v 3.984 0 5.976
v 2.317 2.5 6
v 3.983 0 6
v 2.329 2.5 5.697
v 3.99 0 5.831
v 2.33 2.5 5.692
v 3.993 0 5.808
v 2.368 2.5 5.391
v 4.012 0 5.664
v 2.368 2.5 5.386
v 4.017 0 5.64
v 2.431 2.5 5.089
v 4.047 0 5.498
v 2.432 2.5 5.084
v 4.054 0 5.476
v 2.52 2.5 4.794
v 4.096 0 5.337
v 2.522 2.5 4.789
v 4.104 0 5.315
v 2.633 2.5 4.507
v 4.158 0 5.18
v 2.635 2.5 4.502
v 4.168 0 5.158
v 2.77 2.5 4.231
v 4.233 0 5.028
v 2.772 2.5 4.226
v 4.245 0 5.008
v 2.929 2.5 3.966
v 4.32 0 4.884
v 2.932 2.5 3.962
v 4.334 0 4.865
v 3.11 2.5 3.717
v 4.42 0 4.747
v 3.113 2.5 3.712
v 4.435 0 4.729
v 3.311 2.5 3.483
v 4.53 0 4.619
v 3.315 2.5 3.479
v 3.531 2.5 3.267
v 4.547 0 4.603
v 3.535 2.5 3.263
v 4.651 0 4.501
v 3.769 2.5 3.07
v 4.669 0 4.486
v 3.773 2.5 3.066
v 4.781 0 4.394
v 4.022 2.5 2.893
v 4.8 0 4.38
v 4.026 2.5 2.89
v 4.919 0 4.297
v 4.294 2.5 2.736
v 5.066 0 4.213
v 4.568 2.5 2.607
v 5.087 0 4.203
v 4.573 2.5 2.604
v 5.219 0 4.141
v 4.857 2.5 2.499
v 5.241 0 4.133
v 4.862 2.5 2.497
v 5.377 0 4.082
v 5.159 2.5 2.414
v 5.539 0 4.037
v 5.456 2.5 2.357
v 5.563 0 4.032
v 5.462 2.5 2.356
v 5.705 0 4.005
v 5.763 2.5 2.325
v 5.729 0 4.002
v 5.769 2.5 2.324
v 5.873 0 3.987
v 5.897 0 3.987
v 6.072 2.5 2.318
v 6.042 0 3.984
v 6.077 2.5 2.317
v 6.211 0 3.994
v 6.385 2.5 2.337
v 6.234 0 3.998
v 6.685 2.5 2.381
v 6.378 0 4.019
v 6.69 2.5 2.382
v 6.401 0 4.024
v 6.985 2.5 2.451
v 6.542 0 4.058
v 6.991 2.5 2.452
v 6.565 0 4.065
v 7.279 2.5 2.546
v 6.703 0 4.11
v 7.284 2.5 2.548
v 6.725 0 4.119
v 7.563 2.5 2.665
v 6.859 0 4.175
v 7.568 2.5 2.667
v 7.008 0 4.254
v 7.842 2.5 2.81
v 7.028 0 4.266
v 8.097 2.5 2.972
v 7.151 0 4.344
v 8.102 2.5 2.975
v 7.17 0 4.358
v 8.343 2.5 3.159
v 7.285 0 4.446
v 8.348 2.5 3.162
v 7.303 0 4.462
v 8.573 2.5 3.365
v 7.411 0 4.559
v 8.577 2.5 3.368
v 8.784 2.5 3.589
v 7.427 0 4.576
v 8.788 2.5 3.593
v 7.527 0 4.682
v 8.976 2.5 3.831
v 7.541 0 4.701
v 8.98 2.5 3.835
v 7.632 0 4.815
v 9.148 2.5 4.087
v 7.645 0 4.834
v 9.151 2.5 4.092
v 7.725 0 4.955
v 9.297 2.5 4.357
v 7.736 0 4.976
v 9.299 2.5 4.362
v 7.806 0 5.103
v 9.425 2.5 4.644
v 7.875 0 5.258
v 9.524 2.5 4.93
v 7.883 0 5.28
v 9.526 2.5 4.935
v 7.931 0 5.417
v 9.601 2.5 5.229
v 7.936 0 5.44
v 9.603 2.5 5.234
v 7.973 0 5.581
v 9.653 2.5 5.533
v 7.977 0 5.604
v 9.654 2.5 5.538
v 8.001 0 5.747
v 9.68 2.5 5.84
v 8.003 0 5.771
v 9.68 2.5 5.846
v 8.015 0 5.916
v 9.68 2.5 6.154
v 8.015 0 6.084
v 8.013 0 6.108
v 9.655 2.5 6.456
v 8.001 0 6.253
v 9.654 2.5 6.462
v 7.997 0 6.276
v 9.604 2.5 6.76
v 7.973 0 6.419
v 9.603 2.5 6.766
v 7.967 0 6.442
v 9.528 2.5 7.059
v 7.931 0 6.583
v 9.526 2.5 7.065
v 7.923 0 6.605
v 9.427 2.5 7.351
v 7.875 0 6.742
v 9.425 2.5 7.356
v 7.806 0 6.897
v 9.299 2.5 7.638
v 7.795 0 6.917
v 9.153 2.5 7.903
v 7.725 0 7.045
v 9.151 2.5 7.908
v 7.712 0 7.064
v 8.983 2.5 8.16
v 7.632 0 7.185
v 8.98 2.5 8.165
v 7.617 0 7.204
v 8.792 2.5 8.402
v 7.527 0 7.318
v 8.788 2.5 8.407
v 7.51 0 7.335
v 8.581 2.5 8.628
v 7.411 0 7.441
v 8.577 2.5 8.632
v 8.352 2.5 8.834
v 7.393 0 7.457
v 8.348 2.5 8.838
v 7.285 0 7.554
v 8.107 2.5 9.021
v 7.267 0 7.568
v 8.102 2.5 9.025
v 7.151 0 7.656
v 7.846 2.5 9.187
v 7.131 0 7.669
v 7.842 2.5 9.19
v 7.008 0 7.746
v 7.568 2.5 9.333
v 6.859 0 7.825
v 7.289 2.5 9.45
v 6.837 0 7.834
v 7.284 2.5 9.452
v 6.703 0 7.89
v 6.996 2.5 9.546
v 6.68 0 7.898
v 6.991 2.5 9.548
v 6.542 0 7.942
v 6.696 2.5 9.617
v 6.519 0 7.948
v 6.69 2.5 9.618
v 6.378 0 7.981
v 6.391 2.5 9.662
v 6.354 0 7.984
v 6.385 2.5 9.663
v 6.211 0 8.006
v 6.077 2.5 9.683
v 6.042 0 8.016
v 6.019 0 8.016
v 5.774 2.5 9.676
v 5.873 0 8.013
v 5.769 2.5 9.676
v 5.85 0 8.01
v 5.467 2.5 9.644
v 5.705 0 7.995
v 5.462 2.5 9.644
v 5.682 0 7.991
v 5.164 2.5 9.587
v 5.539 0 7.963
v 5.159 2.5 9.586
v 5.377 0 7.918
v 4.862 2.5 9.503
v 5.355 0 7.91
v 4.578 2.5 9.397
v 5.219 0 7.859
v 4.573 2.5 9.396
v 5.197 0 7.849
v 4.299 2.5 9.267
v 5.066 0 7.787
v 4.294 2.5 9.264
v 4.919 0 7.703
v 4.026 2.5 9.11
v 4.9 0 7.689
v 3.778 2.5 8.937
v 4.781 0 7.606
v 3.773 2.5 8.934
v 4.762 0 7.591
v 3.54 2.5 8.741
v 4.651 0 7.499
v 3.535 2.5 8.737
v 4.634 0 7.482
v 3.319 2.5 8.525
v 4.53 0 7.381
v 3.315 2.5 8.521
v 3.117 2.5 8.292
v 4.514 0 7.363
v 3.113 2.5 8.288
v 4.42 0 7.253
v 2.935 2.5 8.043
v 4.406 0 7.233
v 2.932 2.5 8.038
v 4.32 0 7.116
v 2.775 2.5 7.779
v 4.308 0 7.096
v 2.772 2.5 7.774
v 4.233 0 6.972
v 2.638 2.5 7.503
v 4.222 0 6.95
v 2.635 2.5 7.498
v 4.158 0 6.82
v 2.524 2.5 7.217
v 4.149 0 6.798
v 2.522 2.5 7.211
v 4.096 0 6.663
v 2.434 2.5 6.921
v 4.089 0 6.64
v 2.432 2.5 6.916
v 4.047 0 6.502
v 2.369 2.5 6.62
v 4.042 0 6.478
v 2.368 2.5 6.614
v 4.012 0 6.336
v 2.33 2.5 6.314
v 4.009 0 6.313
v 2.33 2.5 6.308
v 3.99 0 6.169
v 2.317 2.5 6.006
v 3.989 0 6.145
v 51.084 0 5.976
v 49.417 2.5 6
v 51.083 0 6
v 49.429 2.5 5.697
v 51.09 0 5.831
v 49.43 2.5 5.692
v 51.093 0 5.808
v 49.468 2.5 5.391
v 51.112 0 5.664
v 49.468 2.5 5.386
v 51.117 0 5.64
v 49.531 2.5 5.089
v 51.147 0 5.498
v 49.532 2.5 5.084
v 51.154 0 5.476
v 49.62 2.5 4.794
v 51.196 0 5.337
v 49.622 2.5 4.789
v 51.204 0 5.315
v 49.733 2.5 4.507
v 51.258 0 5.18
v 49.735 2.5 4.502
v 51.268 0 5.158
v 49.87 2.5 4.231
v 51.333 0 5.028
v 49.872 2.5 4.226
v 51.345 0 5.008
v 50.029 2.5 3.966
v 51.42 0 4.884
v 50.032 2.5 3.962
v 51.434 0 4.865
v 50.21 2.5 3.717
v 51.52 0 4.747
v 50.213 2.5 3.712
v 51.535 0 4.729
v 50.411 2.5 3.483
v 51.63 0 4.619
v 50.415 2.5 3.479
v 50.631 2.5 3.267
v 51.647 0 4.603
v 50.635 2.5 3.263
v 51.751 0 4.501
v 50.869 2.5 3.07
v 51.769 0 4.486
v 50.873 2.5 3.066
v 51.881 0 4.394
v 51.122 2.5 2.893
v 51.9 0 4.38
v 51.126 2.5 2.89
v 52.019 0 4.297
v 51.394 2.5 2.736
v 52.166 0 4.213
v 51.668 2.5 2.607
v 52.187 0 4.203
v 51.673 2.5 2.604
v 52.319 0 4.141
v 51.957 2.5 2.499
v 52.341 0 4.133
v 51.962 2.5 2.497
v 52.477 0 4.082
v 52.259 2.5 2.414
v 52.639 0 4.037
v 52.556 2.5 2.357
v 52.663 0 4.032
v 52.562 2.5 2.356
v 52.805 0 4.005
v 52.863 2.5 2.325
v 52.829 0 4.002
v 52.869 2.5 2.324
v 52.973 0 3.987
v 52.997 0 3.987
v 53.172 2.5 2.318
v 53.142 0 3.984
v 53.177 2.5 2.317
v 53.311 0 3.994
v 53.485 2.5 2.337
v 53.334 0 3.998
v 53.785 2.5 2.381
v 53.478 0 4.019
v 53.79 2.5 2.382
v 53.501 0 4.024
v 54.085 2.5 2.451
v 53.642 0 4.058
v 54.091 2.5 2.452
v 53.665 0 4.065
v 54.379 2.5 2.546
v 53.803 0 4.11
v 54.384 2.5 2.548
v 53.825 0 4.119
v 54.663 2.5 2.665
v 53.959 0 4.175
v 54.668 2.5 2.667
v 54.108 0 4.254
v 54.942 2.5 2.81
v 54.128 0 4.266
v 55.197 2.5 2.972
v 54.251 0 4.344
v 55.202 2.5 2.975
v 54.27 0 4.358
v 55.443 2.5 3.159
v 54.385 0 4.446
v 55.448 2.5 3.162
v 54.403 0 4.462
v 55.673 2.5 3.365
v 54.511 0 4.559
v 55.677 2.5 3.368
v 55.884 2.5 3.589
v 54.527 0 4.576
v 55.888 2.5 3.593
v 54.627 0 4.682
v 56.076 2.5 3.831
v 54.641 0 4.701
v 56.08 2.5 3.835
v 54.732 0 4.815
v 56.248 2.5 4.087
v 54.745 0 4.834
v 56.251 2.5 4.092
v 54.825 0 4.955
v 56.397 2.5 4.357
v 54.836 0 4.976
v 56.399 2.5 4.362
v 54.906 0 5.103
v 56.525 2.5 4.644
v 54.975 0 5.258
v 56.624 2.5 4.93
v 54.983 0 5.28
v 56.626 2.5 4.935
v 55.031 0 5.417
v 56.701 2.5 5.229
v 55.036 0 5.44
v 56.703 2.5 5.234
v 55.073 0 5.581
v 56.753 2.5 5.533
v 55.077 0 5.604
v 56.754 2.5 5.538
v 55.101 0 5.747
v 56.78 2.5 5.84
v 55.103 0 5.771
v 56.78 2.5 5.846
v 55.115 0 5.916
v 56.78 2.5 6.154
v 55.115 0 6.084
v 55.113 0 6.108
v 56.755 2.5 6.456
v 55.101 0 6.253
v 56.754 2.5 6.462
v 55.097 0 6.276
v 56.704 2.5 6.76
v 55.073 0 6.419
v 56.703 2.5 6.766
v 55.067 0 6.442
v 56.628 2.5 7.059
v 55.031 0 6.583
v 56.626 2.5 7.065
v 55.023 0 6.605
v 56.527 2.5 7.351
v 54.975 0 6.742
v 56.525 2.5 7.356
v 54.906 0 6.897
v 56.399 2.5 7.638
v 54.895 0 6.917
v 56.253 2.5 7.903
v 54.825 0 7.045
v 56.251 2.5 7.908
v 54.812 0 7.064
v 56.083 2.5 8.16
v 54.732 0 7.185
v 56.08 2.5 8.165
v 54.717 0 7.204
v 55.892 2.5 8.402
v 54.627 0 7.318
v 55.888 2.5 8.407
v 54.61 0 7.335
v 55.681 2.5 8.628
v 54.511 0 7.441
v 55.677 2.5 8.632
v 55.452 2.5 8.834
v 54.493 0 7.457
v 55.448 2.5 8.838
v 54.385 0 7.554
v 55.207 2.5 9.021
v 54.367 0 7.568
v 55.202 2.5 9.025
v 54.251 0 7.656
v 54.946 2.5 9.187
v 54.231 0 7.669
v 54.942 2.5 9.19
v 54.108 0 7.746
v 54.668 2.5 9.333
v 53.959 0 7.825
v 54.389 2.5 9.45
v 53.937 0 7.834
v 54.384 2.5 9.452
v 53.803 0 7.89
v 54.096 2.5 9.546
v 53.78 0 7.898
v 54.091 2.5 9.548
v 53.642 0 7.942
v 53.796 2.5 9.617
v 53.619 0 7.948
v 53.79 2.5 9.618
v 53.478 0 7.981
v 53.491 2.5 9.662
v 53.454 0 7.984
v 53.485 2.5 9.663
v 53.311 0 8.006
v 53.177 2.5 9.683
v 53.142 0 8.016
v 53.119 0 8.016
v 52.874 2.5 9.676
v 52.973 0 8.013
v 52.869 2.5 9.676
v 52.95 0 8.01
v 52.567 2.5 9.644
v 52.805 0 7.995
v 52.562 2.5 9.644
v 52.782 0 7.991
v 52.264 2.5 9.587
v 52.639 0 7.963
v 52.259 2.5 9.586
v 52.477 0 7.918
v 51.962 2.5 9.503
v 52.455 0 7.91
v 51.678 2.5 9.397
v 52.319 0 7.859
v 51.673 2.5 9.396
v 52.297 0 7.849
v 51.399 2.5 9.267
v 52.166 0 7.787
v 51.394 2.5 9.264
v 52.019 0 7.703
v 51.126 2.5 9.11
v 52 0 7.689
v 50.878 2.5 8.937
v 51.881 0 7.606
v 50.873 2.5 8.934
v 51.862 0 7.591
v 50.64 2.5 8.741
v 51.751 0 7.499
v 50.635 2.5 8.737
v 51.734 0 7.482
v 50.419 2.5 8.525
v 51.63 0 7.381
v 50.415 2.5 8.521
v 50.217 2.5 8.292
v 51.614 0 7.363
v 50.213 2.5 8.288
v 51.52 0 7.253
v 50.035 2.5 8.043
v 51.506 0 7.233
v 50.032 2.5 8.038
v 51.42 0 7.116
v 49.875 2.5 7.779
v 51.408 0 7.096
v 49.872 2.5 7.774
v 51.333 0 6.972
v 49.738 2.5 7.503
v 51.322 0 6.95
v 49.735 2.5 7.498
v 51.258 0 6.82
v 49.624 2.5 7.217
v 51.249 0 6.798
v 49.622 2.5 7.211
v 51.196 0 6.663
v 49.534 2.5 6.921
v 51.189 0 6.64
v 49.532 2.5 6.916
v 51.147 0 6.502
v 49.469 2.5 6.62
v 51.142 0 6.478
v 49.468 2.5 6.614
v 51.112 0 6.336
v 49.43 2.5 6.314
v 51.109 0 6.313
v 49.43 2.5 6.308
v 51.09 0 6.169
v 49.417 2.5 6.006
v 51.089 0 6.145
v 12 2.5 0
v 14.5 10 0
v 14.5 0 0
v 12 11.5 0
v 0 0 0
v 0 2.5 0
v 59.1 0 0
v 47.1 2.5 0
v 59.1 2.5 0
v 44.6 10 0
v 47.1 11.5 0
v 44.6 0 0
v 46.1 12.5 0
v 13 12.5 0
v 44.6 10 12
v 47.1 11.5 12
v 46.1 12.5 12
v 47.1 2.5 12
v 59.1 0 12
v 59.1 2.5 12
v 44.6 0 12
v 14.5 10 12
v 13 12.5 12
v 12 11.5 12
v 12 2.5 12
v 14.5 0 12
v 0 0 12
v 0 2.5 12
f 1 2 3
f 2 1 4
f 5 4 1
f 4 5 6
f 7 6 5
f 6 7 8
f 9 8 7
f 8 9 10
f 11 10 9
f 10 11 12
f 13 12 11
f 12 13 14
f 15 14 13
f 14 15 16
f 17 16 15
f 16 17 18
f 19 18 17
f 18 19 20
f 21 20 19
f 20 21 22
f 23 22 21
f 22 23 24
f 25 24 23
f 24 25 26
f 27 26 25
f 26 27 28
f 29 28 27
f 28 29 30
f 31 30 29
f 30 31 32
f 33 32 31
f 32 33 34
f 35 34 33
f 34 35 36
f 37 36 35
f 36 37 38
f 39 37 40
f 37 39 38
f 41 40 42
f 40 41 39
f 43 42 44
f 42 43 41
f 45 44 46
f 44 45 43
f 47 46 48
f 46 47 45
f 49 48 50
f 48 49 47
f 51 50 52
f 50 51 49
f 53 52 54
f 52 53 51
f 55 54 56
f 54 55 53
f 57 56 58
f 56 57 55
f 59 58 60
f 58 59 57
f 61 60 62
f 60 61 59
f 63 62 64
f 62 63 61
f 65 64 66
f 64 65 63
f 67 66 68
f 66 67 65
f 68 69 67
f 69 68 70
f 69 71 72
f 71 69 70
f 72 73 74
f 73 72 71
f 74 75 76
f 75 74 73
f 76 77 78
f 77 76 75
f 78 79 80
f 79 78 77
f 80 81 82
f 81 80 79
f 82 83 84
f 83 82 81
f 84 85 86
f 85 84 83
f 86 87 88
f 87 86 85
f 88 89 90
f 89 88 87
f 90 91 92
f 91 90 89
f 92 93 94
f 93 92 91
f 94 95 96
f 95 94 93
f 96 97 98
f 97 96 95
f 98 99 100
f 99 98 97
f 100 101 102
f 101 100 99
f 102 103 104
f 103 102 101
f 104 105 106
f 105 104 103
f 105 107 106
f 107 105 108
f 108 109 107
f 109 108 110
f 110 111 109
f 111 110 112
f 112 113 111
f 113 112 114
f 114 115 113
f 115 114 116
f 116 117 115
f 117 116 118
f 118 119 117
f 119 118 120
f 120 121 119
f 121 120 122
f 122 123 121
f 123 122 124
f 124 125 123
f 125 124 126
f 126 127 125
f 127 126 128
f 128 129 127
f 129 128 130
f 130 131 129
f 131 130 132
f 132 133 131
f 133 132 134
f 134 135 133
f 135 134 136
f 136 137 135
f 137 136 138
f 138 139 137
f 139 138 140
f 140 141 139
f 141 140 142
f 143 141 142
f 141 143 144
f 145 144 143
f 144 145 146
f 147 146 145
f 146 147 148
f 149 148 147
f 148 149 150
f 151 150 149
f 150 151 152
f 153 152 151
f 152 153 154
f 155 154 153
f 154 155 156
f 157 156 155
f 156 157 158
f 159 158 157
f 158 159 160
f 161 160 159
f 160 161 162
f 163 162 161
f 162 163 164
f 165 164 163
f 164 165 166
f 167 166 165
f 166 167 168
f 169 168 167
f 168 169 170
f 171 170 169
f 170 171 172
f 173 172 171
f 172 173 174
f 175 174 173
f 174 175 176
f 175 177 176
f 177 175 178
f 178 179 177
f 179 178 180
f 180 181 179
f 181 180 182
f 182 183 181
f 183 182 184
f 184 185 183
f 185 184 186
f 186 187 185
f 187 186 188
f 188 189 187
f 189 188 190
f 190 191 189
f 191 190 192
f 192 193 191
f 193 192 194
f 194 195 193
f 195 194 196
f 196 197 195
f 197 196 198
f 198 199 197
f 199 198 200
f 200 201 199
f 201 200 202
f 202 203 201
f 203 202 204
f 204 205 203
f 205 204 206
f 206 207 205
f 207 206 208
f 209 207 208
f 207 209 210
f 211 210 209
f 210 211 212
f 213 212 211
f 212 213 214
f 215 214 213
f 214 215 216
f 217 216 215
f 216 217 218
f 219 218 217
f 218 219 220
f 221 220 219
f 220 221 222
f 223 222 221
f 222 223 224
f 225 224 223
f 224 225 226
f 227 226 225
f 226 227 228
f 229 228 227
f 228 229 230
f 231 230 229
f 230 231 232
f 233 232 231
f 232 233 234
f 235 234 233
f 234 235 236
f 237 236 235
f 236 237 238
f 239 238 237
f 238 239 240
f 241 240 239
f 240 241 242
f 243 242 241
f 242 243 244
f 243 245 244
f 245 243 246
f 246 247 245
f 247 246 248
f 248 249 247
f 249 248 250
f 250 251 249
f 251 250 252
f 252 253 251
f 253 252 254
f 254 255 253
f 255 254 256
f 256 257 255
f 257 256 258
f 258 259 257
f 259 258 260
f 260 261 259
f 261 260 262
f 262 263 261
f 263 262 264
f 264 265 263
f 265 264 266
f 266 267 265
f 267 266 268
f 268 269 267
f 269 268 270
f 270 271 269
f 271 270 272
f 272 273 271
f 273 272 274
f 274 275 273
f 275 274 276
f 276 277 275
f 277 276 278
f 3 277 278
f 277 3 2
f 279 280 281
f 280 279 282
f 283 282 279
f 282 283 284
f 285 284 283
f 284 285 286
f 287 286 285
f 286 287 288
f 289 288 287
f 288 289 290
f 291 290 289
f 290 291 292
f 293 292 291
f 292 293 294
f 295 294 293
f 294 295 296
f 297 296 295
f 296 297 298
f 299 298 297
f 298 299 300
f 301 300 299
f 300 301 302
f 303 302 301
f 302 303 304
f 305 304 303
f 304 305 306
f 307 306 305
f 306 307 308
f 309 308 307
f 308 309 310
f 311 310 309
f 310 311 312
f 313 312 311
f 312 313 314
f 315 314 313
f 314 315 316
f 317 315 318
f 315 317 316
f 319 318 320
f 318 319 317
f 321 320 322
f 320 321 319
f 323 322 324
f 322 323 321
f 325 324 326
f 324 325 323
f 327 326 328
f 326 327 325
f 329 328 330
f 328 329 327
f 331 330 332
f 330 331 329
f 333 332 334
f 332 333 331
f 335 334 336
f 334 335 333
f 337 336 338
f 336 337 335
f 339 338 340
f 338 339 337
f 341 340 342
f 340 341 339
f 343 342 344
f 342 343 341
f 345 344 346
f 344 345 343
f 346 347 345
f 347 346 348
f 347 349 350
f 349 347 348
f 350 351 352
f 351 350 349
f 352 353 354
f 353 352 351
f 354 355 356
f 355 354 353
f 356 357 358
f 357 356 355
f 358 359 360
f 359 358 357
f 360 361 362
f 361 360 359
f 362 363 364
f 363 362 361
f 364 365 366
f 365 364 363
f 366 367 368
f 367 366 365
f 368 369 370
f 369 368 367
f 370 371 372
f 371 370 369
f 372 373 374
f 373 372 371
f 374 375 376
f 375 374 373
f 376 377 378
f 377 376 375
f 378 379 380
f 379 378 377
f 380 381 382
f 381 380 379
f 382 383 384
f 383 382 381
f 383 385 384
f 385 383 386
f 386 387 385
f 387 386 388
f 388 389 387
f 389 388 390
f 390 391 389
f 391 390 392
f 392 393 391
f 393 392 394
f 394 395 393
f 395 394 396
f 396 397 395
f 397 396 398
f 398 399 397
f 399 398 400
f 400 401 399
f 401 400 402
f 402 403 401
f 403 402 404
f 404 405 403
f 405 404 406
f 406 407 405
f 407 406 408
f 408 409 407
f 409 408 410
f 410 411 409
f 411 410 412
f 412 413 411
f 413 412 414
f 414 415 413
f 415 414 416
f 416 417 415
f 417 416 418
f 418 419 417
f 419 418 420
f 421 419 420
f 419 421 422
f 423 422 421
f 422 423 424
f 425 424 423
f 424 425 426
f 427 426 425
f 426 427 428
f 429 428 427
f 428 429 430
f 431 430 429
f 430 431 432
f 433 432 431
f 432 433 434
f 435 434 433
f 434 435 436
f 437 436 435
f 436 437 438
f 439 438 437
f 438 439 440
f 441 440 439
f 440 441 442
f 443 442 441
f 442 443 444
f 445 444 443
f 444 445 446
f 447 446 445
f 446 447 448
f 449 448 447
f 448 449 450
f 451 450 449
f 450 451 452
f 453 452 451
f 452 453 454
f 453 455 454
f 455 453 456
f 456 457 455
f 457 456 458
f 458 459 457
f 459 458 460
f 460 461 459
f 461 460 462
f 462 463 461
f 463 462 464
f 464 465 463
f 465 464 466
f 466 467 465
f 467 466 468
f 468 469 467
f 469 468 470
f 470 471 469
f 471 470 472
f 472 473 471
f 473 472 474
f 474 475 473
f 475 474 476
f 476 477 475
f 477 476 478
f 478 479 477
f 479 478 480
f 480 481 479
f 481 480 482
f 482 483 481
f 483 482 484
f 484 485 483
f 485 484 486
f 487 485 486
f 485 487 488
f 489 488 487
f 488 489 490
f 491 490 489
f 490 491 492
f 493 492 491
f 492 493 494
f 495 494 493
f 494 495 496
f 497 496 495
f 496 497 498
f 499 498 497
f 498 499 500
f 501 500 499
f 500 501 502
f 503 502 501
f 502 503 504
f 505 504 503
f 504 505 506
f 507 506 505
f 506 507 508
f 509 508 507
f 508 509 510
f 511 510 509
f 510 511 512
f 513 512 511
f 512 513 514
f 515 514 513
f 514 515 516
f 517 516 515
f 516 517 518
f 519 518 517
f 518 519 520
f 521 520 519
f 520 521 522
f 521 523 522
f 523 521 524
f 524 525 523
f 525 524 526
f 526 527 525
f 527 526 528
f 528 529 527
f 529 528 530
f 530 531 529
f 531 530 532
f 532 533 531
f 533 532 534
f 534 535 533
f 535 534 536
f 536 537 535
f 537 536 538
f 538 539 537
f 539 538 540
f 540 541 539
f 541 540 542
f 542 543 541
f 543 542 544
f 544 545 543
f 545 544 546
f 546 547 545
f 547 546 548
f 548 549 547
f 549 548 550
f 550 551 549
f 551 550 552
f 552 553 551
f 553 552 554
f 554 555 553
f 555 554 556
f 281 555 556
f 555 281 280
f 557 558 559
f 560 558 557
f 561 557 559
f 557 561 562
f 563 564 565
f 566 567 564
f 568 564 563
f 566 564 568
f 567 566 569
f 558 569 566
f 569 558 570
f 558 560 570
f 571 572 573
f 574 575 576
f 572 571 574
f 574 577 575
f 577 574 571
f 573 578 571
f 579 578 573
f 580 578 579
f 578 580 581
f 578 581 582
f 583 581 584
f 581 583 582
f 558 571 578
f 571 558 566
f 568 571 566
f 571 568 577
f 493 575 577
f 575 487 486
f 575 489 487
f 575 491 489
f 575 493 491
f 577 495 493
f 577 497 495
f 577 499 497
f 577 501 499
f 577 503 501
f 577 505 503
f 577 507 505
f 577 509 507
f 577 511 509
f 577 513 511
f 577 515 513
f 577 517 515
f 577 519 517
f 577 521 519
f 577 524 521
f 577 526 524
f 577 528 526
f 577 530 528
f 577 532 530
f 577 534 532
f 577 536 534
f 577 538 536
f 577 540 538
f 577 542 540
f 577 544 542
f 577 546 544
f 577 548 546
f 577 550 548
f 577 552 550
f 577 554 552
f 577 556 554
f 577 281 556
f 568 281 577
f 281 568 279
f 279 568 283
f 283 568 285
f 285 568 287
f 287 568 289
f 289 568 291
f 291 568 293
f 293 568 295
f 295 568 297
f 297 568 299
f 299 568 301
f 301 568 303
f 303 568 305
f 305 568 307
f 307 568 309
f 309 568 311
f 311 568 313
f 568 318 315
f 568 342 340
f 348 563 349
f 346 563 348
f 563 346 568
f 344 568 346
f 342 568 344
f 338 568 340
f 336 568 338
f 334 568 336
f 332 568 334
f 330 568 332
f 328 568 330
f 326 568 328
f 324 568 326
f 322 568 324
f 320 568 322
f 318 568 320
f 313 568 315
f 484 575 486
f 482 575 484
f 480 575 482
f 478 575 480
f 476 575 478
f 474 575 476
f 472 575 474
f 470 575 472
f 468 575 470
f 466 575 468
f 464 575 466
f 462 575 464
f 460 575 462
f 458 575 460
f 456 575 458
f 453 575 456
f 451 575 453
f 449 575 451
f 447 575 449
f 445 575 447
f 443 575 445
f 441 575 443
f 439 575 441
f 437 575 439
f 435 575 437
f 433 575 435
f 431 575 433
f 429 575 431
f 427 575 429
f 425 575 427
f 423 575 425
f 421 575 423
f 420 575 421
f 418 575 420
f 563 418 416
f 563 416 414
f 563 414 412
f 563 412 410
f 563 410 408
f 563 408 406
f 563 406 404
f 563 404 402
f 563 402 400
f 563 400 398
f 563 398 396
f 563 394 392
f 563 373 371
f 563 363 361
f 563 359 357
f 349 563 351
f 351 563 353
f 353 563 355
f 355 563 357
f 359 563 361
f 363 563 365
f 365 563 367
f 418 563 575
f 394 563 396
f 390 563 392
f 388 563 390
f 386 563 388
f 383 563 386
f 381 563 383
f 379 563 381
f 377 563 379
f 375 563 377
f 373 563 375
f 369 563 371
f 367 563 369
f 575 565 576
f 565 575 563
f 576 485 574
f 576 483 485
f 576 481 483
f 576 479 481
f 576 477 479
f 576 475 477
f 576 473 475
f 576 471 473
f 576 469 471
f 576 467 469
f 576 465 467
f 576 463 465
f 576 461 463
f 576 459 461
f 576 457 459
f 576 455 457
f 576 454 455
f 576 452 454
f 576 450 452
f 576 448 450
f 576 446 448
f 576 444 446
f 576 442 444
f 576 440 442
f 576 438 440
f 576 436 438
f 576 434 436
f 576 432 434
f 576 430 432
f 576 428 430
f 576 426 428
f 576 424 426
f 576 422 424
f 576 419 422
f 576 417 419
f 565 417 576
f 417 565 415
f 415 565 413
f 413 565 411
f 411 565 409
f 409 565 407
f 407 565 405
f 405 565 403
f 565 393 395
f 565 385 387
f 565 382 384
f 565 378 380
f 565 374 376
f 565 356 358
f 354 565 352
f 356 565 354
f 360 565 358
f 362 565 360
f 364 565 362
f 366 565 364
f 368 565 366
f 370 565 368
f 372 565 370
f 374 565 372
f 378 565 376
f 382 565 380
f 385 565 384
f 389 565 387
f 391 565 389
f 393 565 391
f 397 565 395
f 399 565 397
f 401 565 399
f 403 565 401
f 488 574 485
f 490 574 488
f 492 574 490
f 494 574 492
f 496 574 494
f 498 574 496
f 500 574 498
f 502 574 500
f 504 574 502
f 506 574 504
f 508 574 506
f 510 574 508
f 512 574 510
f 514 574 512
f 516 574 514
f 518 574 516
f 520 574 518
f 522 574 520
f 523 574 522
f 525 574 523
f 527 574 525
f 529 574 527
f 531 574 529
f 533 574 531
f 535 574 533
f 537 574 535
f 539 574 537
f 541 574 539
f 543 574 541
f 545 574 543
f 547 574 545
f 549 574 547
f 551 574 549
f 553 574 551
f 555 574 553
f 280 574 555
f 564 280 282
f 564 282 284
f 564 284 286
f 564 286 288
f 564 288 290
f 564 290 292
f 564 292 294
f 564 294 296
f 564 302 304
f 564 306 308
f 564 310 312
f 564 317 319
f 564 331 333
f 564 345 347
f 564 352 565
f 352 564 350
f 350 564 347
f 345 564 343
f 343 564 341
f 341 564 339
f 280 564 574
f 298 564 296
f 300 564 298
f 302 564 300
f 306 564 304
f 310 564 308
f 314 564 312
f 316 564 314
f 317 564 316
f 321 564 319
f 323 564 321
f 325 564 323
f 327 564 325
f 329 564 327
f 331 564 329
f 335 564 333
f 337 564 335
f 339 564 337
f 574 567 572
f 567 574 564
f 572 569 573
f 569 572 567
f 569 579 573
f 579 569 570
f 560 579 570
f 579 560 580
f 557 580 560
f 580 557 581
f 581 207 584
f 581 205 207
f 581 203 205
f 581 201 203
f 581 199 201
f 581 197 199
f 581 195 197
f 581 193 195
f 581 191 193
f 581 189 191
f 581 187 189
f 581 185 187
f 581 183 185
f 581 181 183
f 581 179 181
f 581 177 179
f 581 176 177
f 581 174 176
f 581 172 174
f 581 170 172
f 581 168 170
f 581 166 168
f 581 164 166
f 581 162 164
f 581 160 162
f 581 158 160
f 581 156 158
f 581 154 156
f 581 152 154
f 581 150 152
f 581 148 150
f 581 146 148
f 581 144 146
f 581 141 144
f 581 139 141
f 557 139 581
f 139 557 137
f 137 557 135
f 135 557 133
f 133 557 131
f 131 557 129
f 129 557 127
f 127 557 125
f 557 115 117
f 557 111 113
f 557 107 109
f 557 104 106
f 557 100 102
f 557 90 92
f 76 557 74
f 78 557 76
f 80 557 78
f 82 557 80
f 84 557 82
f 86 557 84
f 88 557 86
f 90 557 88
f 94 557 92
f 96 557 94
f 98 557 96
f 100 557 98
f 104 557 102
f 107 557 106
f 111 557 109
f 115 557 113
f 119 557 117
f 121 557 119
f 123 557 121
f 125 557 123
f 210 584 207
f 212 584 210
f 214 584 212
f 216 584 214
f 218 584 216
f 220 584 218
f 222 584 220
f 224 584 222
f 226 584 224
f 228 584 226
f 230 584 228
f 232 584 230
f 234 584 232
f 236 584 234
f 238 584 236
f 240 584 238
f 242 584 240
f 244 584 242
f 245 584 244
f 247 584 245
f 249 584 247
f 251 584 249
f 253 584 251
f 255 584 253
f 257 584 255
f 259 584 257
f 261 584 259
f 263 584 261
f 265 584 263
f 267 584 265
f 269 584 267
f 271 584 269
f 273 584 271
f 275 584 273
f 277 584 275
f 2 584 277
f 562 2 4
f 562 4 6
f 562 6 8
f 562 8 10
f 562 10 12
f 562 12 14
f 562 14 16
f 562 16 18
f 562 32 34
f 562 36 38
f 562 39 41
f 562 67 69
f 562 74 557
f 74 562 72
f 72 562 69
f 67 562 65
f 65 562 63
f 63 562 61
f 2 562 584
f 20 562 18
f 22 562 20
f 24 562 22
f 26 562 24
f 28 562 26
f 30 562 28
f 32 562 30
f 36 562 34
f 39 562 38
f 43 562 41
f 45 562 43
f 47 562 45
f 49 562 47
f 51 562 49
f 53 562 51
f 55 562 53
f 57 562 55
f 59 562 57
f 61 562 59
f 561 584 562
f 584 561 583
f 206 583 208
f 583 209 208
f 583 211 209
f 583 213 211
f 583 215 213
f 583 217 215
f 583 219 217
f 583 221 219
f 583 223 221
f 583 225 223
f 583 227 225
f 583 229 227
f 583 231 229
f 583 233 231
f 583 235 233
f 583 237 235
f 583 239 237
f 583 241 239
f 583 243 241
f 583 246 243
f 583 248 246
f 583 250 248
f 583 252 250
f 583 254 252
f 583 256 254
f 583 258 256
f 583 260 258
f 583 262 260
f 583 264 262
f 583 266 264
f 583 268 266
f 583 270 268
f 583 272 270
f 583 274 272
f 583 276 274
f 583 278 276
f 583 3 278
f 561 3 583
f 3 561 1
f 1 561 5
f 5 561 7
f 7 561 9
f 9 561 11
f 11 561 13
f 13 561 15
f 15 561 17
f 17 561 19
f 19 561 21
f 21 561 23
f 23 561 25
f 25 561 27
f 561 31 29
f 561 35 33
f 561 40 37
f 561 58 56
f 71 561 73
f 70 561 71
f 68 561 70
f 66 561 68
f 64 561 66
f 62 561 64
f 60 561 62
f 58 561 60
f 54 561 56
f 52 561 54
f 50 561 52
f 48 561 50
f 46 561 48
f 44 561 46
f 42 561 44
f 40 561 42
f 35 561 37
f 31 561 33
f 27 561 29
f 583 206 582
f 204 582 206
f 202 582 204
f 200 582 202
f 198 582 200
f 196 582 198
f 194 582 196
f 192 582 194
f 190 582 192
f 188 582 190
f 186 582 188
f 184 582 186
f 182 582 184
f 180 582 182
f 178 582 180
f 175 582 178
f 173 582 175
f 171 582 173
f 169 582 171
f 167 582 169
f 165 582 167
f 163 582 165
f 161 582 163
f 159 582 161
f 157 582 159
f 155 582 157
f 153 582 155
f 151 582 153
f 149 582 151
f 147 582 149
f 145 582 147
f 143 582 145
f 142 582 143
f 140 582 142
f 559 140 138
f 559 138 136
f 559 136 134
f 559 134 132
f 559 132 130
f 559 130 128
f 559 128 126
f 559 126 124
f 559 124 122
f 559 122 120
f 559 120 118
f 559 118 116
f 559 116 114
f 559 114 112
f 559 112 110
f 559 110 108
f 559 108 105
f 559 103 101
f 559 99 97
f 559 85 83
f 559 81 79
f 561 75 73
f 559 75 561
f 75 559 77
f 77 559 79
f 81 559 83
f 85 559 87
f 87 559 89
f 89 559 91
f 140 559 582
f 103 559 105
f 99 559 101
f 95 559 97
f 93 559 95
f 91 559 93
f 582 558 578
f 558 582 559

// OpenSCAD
// file: Parts/Screw.scad
// created by IndiePandaaaaa | Lukas

TOLERANCE = .1;
$fn = $preview ? 30 : 75;

// metric standards                          M1   M2   M3   M4   M5 M6 M7   M8   M9  M10
function screw_metric_corehole(standard) = [.75, 1.6, 2.5, 3.3, 4.2, 5, 6, 6.8, 7.8, 8.5][standard - 1];
function screw_metric_borehole(standard) = [0, 0, 3.4, 4.5, 5.5, 6.6, 0, 9, 0, 11][standard - 1];
function screw_metric_countersunk_height(standard) = [0, 0, 1.7, 2.3, 2.8, 3.3, 0, 4.4, 0, 5.5][standard - 1];
function screw_metric_countersunk_od(standard) = standard * 2;

module screw_metric_countersunk(standard, length, unthreaded_length = 0, borehole_length = 0, tolerance = .15) {
  if (screw_metric_corehole(standard=standard) == 0) echo("ERROR: screw_metric_corehole value has not been set yet.");
  if (screw_metric_borehole(standard=standard) == 0) echo("ERROR: screw_metric_borehole value has not been set yet.");
  if (screw_metric_countersunk_height(standard=standard) == 0) echo("ERROR: screw_metric_countersunk_height value has not been set yet.");

  union() {
    translate(v=[0, 0, -.1]) {
      cylinder(h=.2 + borehole_length, d=screw_metric_countersunk_od(standard) + tolerance, center=false);
      translate(v=[0, 0, -screw_metric_countersunk_height(standard)]) {
        cylinder(h=screw_metric_countersunk_height(standard) + .01, d2=screw_metric_countersunk_od(standard) + tolerance, d1=screw_metric_borehole(standard) + tolerance, center=false);
        translate(v=[0, 0, -.1]) cylinder(h=.1, d=screw_metric_borehole(standard) + tolerance, center=false);
      }
    }
    translate(v=[0, 0, -length]) cylinder(h=length, d=screw_metric_corehole(standard) + tolerance, center=false);

    // unthreaded part
    translate(v=[0, 0, -.1 - screw_metric_countersunk_height(standard) - unthreaded_length]) cylinder(h=unthreaded_length + .1, d=screw_metric_borehole(standard) + tolerance, center=false);
  }
}

// TODO: module metric cylindric head screws

// TODO: module metric rounded head screws

function screw_wood_corehole(diameter) = diameter * 0.75;
function screw_wood_borehole(diameter) = diameter * 1.25;
function screw_wood_countersunk_height(diameter) = diameter * 0.75;

module screw_wood_countersunk(diameter, length, unthreaded_length = 0, tolerance = .15) {
  if (screw_metric_corehole(standard=standard) == 0) echo("ERROR: screw_metric_corehole value has not been set yet.");
  if (screw_metric_borehole(standard=standard) == 0) echo("ERROR: screw_metric_borehole value has not been set yet.");
  if (screw_metric_countersunk_height(standard=standard) == 0) echo("ERROR: screw_metric_countersunk_height value has not been set yet.");

  // TODO: add module for wood screws 
  union(){}
}

// TODO: module wood cylindric head screws

// TODO: module wood rounded head screws

function cone_diameter(diameter) = diameter * 2;
function cone_diameter_cutout(diameter) = diameter * 2 + 0.5;
function cone_height(diameter) = diameter * 0.75;

module screw(diameter, length = 12, cutout_sample = false) {
  module base_model(diameter, length, cone_height, cone_diameter, offset = 0) {
    rotate_extrude(angle=360) {
      polygon(
        [
          [0, 0],
          [(diameter + offset) / 2, 0],
          [(diameter + offset) / 2, (length + offset) - (cone_height + offset)],
          [(cone_diameter + offset) / 2, length + offset],
          [0, length + offset],
        ]
      );
    }
  }

  if (length < diameter) {
    echo("Screw is too short");
    length = diameter + 5;
    echo("New length is: ", length);
  }

  if (!cutout_sample) {
    translate([0, 0, -length])
      difference() {
        base_model(diameter, length, cone_height(diameter), cone_diameter(diameter));

        // top cross part
        translate([0, 0, length - (cone_height(diameter) - diameter / 2) + .1])
          difference() {
            rotate([0, 0, 45])
              rotate_extrude(angle=360) {
                polygon(
                  [
                    [0, 0],
                    [diameter * 1.4 / 2, 0],
                    [cone_diameter(diameter) / 3, cone_height(diameter) - diameter / 2],
                    [0, cone_height(diameter) - diameter / 2],
                  ]
                );
              }
            for (i = [0:1:3]) {
              rotate([0, 0, 90 * i])
                translate([diameter / 3.18 / 2, diameter / 3.18 / 2, 0]) cube(cone_height(diameter));
            }
          }
      }
  } else {
    offset = 0;
    diameter = cone_diameter_cutout(diameter) / 2; // is duplicated by function, used to reduce error
    translate([0, 0, -length - offset / 2]) {
      base_model(diameter, length, cone_height(diameter), cone_diameter(diameter), offset);
      translate([0, 0, length - .005]) cylinder(r=diameter, h=50);
    }
  }
}

module screw_corehole(diameter_screw, diameter_core, unthreaded_length, length = 12) {
  union() {
    screw(diameter=diameter_screw, length=unthreaded_length, cutout_sample=true);
    if (unthreaded_length < diameter_core - .1) {
      translate(v=[0, 0, -diameter_screw * .8]) cylinder(h=diameter_screw, d=diameter_screw + .3, center=false);
    }
    translate([0, 0, -length]) cylinder(d=diameter_core, h=length - unthreaded_length + .1);
  }
}

module screw_with_nut(screw_length, diameter, square_channel = false, tolerance = .1) {
  function od(width) = ( (width / 2) / cos(30)) * 2; // calculates nut diameter from given width
  nut_thickness = [0.8, 1.6, 2.4, 3.2, 4, 5, 5.5, 6.5];
  nut_width = [2.5, 4, 5.5, 7.1, 8.1, 10.1, 11.1, 13.1];

  if (!(0 < diameter && diameter <= 8 && diameter == round(diameter))) {
    echo("module is only defined for integer values from M1 to M8.");
  } else {
    union() {
      if (!square_channel) {
        screw(diameter=diameter, length=screw_length, cutout_sample=true);

        translate([0, 0, -(screw_length * 2 - nut_thickness[diameter - 1])])
          cylinder(d=od(nut_width[diameter - 1]) + tolerance, h=screw_length, $fn=6);
      } else {
        screw(diameter=diameter, length=screw_length + diameter, cutout_sample=true);
        translate([-od(nut_width[diameter - 1]) / 2 - tolerance, -(nut_width[diameter - 1] / 2), -(screw_length)])
          cube([od(nut_width[diameter - 1]) + screw_length, nut_width[diameter - 1] + tolerance, nut_thickness[diameter - 1] + tolerance]);
      }
    }
  }
}

translate(v=[0, 0, 0]) screw(diameter=3.5, length=12, cutout_sample=false);
translate(v=[20, 0, 0]) screw_corehole(diameter_screw=3, diameter_core=2.5, unthreaded_length=15, length=20);
translate(v=[40, 0, 0]) screw_with_nut(screw_length=30, diameter=4, square_channel=false, tolerance=.1);
translate(v=[60, 0, 0]) SCREW_METRIC_COUNTERSUNK(standard=3, length=12, unthreaded_length=5, borehole_length=5);
// main file
// created by IndiePandaaaaa|Lukas
// encoding: utf-8

use <Parts/Screw.scad>

$fn = $preview ? 25 : 75;

// DEFAULT VALUES
DEVICE_WIDTH = 42;
DEVICE_HEIGHT = 12.5;

//DIGITUS Ultra Slim HDMI Splitter DS-45322 DEVICE_WIDTH = 83.1; DEVICE_HEIGHT = 8.9;
//LOGILINK Digital to Analog Audio Converter CA0101 v2 DEVICE_WIDTH = 53.5; DEVICE_HEIGHT = 21.5;
//DELL 130W PSU DEVICE_WIDTH = 76.2; DEVICE_HEIGHT = 24.4;
//HP 120W PSU DEVICE_WIDTH = 68.6; DEVICE_HEIGHT = 25.2;
//USB Cable Plug DEVICE_WIDTH = 11; DEVICE_HEIGHT = 14.5;

MATERIAL_THICKNESS = 2.5;
SCREW_DIAMETER = 3.5;

module Bracket(screwSocketWidth, thicknessBracket, deviceWidth, deviceHeight, chamfer = 1) {
  uBracket(screwSocketWidth=screwSocketWidth, thicknessBracket=thicknessBracket, deviceWidth=deviceWidth, deviceHeight=deviceHeight);
}

module uBracket(screwSocketWidth, thicknessBracket, deviceWidth, deviceHeight, chamfer = 1) {
  difference() {
    screwSocketWidth = SCREW_DIAMETER * 2 + 5;

    deviceWidth = deviceWidth + 0.1; // added .1 for tolerance issues
    linear_extrude(height=screwSocketWidth) {
      endWidth = (screwSocketWidth + thicknessBracket) * 2;
      polygon(
        points=[
          [0, 0],
          [screwSocketWidth + thicknessBracket, 0],
          [screwSocketWidth + thicknessBracket, deviceHeight],
          [screwSocketWidth + thicknessBracket + deviceWidth, deviceHeight],
          [screwSocketWidth + thicknessBracket + deviceWidth, 0],
          [endWidth + deviceWidth, 0],
          [endWidth + deviceWidth, thicknessBracket],
          [screwSocketWidth + thicknessBracket + deviceWidth + thicknessBracket, thicknessBracket],
          [
            screwSocketWidth + thicknessBracket + deviceWidth + thicknessBracket,
            deviceHeight + thicknessBracket - chamfer,
          ],
          [
            screwSocketWidth + thicknessBracket + deviceWidth + thicknessBracket - chamfer,
            deviceHeight + thicknessBracket,
          ],
          [screwSocketWidth + chamfer, deviceHeight + thicknessBracket],
          [screwSocketWidth, deviceHeight + thicknessBracket - chamfer],
          [screwSocketWidth, thicknessBracket],
          [0, thicknessBracket],
        ]
      );
    }

    for (i = [0:1]) {
      translate(
        [
          screwSocketWidth / 2 + (screwSocketWidth + deviceWidth + thicknessBracket * 2) * i,
          thicknessBracket + .1,
          screwSocketWidth / 2,
        ]
      )
        rotate([-90, 0, 0])
          screw(SCREW_DIAMETER, 12, true);
    }
  }
}
uBracket(screwSocketWidth=SCREW_DIAMETER * 4, thicknessBracket=MATERIAL_THICKNESS, deviceWidth=30, deviceHeight=10, chamfer=1);
